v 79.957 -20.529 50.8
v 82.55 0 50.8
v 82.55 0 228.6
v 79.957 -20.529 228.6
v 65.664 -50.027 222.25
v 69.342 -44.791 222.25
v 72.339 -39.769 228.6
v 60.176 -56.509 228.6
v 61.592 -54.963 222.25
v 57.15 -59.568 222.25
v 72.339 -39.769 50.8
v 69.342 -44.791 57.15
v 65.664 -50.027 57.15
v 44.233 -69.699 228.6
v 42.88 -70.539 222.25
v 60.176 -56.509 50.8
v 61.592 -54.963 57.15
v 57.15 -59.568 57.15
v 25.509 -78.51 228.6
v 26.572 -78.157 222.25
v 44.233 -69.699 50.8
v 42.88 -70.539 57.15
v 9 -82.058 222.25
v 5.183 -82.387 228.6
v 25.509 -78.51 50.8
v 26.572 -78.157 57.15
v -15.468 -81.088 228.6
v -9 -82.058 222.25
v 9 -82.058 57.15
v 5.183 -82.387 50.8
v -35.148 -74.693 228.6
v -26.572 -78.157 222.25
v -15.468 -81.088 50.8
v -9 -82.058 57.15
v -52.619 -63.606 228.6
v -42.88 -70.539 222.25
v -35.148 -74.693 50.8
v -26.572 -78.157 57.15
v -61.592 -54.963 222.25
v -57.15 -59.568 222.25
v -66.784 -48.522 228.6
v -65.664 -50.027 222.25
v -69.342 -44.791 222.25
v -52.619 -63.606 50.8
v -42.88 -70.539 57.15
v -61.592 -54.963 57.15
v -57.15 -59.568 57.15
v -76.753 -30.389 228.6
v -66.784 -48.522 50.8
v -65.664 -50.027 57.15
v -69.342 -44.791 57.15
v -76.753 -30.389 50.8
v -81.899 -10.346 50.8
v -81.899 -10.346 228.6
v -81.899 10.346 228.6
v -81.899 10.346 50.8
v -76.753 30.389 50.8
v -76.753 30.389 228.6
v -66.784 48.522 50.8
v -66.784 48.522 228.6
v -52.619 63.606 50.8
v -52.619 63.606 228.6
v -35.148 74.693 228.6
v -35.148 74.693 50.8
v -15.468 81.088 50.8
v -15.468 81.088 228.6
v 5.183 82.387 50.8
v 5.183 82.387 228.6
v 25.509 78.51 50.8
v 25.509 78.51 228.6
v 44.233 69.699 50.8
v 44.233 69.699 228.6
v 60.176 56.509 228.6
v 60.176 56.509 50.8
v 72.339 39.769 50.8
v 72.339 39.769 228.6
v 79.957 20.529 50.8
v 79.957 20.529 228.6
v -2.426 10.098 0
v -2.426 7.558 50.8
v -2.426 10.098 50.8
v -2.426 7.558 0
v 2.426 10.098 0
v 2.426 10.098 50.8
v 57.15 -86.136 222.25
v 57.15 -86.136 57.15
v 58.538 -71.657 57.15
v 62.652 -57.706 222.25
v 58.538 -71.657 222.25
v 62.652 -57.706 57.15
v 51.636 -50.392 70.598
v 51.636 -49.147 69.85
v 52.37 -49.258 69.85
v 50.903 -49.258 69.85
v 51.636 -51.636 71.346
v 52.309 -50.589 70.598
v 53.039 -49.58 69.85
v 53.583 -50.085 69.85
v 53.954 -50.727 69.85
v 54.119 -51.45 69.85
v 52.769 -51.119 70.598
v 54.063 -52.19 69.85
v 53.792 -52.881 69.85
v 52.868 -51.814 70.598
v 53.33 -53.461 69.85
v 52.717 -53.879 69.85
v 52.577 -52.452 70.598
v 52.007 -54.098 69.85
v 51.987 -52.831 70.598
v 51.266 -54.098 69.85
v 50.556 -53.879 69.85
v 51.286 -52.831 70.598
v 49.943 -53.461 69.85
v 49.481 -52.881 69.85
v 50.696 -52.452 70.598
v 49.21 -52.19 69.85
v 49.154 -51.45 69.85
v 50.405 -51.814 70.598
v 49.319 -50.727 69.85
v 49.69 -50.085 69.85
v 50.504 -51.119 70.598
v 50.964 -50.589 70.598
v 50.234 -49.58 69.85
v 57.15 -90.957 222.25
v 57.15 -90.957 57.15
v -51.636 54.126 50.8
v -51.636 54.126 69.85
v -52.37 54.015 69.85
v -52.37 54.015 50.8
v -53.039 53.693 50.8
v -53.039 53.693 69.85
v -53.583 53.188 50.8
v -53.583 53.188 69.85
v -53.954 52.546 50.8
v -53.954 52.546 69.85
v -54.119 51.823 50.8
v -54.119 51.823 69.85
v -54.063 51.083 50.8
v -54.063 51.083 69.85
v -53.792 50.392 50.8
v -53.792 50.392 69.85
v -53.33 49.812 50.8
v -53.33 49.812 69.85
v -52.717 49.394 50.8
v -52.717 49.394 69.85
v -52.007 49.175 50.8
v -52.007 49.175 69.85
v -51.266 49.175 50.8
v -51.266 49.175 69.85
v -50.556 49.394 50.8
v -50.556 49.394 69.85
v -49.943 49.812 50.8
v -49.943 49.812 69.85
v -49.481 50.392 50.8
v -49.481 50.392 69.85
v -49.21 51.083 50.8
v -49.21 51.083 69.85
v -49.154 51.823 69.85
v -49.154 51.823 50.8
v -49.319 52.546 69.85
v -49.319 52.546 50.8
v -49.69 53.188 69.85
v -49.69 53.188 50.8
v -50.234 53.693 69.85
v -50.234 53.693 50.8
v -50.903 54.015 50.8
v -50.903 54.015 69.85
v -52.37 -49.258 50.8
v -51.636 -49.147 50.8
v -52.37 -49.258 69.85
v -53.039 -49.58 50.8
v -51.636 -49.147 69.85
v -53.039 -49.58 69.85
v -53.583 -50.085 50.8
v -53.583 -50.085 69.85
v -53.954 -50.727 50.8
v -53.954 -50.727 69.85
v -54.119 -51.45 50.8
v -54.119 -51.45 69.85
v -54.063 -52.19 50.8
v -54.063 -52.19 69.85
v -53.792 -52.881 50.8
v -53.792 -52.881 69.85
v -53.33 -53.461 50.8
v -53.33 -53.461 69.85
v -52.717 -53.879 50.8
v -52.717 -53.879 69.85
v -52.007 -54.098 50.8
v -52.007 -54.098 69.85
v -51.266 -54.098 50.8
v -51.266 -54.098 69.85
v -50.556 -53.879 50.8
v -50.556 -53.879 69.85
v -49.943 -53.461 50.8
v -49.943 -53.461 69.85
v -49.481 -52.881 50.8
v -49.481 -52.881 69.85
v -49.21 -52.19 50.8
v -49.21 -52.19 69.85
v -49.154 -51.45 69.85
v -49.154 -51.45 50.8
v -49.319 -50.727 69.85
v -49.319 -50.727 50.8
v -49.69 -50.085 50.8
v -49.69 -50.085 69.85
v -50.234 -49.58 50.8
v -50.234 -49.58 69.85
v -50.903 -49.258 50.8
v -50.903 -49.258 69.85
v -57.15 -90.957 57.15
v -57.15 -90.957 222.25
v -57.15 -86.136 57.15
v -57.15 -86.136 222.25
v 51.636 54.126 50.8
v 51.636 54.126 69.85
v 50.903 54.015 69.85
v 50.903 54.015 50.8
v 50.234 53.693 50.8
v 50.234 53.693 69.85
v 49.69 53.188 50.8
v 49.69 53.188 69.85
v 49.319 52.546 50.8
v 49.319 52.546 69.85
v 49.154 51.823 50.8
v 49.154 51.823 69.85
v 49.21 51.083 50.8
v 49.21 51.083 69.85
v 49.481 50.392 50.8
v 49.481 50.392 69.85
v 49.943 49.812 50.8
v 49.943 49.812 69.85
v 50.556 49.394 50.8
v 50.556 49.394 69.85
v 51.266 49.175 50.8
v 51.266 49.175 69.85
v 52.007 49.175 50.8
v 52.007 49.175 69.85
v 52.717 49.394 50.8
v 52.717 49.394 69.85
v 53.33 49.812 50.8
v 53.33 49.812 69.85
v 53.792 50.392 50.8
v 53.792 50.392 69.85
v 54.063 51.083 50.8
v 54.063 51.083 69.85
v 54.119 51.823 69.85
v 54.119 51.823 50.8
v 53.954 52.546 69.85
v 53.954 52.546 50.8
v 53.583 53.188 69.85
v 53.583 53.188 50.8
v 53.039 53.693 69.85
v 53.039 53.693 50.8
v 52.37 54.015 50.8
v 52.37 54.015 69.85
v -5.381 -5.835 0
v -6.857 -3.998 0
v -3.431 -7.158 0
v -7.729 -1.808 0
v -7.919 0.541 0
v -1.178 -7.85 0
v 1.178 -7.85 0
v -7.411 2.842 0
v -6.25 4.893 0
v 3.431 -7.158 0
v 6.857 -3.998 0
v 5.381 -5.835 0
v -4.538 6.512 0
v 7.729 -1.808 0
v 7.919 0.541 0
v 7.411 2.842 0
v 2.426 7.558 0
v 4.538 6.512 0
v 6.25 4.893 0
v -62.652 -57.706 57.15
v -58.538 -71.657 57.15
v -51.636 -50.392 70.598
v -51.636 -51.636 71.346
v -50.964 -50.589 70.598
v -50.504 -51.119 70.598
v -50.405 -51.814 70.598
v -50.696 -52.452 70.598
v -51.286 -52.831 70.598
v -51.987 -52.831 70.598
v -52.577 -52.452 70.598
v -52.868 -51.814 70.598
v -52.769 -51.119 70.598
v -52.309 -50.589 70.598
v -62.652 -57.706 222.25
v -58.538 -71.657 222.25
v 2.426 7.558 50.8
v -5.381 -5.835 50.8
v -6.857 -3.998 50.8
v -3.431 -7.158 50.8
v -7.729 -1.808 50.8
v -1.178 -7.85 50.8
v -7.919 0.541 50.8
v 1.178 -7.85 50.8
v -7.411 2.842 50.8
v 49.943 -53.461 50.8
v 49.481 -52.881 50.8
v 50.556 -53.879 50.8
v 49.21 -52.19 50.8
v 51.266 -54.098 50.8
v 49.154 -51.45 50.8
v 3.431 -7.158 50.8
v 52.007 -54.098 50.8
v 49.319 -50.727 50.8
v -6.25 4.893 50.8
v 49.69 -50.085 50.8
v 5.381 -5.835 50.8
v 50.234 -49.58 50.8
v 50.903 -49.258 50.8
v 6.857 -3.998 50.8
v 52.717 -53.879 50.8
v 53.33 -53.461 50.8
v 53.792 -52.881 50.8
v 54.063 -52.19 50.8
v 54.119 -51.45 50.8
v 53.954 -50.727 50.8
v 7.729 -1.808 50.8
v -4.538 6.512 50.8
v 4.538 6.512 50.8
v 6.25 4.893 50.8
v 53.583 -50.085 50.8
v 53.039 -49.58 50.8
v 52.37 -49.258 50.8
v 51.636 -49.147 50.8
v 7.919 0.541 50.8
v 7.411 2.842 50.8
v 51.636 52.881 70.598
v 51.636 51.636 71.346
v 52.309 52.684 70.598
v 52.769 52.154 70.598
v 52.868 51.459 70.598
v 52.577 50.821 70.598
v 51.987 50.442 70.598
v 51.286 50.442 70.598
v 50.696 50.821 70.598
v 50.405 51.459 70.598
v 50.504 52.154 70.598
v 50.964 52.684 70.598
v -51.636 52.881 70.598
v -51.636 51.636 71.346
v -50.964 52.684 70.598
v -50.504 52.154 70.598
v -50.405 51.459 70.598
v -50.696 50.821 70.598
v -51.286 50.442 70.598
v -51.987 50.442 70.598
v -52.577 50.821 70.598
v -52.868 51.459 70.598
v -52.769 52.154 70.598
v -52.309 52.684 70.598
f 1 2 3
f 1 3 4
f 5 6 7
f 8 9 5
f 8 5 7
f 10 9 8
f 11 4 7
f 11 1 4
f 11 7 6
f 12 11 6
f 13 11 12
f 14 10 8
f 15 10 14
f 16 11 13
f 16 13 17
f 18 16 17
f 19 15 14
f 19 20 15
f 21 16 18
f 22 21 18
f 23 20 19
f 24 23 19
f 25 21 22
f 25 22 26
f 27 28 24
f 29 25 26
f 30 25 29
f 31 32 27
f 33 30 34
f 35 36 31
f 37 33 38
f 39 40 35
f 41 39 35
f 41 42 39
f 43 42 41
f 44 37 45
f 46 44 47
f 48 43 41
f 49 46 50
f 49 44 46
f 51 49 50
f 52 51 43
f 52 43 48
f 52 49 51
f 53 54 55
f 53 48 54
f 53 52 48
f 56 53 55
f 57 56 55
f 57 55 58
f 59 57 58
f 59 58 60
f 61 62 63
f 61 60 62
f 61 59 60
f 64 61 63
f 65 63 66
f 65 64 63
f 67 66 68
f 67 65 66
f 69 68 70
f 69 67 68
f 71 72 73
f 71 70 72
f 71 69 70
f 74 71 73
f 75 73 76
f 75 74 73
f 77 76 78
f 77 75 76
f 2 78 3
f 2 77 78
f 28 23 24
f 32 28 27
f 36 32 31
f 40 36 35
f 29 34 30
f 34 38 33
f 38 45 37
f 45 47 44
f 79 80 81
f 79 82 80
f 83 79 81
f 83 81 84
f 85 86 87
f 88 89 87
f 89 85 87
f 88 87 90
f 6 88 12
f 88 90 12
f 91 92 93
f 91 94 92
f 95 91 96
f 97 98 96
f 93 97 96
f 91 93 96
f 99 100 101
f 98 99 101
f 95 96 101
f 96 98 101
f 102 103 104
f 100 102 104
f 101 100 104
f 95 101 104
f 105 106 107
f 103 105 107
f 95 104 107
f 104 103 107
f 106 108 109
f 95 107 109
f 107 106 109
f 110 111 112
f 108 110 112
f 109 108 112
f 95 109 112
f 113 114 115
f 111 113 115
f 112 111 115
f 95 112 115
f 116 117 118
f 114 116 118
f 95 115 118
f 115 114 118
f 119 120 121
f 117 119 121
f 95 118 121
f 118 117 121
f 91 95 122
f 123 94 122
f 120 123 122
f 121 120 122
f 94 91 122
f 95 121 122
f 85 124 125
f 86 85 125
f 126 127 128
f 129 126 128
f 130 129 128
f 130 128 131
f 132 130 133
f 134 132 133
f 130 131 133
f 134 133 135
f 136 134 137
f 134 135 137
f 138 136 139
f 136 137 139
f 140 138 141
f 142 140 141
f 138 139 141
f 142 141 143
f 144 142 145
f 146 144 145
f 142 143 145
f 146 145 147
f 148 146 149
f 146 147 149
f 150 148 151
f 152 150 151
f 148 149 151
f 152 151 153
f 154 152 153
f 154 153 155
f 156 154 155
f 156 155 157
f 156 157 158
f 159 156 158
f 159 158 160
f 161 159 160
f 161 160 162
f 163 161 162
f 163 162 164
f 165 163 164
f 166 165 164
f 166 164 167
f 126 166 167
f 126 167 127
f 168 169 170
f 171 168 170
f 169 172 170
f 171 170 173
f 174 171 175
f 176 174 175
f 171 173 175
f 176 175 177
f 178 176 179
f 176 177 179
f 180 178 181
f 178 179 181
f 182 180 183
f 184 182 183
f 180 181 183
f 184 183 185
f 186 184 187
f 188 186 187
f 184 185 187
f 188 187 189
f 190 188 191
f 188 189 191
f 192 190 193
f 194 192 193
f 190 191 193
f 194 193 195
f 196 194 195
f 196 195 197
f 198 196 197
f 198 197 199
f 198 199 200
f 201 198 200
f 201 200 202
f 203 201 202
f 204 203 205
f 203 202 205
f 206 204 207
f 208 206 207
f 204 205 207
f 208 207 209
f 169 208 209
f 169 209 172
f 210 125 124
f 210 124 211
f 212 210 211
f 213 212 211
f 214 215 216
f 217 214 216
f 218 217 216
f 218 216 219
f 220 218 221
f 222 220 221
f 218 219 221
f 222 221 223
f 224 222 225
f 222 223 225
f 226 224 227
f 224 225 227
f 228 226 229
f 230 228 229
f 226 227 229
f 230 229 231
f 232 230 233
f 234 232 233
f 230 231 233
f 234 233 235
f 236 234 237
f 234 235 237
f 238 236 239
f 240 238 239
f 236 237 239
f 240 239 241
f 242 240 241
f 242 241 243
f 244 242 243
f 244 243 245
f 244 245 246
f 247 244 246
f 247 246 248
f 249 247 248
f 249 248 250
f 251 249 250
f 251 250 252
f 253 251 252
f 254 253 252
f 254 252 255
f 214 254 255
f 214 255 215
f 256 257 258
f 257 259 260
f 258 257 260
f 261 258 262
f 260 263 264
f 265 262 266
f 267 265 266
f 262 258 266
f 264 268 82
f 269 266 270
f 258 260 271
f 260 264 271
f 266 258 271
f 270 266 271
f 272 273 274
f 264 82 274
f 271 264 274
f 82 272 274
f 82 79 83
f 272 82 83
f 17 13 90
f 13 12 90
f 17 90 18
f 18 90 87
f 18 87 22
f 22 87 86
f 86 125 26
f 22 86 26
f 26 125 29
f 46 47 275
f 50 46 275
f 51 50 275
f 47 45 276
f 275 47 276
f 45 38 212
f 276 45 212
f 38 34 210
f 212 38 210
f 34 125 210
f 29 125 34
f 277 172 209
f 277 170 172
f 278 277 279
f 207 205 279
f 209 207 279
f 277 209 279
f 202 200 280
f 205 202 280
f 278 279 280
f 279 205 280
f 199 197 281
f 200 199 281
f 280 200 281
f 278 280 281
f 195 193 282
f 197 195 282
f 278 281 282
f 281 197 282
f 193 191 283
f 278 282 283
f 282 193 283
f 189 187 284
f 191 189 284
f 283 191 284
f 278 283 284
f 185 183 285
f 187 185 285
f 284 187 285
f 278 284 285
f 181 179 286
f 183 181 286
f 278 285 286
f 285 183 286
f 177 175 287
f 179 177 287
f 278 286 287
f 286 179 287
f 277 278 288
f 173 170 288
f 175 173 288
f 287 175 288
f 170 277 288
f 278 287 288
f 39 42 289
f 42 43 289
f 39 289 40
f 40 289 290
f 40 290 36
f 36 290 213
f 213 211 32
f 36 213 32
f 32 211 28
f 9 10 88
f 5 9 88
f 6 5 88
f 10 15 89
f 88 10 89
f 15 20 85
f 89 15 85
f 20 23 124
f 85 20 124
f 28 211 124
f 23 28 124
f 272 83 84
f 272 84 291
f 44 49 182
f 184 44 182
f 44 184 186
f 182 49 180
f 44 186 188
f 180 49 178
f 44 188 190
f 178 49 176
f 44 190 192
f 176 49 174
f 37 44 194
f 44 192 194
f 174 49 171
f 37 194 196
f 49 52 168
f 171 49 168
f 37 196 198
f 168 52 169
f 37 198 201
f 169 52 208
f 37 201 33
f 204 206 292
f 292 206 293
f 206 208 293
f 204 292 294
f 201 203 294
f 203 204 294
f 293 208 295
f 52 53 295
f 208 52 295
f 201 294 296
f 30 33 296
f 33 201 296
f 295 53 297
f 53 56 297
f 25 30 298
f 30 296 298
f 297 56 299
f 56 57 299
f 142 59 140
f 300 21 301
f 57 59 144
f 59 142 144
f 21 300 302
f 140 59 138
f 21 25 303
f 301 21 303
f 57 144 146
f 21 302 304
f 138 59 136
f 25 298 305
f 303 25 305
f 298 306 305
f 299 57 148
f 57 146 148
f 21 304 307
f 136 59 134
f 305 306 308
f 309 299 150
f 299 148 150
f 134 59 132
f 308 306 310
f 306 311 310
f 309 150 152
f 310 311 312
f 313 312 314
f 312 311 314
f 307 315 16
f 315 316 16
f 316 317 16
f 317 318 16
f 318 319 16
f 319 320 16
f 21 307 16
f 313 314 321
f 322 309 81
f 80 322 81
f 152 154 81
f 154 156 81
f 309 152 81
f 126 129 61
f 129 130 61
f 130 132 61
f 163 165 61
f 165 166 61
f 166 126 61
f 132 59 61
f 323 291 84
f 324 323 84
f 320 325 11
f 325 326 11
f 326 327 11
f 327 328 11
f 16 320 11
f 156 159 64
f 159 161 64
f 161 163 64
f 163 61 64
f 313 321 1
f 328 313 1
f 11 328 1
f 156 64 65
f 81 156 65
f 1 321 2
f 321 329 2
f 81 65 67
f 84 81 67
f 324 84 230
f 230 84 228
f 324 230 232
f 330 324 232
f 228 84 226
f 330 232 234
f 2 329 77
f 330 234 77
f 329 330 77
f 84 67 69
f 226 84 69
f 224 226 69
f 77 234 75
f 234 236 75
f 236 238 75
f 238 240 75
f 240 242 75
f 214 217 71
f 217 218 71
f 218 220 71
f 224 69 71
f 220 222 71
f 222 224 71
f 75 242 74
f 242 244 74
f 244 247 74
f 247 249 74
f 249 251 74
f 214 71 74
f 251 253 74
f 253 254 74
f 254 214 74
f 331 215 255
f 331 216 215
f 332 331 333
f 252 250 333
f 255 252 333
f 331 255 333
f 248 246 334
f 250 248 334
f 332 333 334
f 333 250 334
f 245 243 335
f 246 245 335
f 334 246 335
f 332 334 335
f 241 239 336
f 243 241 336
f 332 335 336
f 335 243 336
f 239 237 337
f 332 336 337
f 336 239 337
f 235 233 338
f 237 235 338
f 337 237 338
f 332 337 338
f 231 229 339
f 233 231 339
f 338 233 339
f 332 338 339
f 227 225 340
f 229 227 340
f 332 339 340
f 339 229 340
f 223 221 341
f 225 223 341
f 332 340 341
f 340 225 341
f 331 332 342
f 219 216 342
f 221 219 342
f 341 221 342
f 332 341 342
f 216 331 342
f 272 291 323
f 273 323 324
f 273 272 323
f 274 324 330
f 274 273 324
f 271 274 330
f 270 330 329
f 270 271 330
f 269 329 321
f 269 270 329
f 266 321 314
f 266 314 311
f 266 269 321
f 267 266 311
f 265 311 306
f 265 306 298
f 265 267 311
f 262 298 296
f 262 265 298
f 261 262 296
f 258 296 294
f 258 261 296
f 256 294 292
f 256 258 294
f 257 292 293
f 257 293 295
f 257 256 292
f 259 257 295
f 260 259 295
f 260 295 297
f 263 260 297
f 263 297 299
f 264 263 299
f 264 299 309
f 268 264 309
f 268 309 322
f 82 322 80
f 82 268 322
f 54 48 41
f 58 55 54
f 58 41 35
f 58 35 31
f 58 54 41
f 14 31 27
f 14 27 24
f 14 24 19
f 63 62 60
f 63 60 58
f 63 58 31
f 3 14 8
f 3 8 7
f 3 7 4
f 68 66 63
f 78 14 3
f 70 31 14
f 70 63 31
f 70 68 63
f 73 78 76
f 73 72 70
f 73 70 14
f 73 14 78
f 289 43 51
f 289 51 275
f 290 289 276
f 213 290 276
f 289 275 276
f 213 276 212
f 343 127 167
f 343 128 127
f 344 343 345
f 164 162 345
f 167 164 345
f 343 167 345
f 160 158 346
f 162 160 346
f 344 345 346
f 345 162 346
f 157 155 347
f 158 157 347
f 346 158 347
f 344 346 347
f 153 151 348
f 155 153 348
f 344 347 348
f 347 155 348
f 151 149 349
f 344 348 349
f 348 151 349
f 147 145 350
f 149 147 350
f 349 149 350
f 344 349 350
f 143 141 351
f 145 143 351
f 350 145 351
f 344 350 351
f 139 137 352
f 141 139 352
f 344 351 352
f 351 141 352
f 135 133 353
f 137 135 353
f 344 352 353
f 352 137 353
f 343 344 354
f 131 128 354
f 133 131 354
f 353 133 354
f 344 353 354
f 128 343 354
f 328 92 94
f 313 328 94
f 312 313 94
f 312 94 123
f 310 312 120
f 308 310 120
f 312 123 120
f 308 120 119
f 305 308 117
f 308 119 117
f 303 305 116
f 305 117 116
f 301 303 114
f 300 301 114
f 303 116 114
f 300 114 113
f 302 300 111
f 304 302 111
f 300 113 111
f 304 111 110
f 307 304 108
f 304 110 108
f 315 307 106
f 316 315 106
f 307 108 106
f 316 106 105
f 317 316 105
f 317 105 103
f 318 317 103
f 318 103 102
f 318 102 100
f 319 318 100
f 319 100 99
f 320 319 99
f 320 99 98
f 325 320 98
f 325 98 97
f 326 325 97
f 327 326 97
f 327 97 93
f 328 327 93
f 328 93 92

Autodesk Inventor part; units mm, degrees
ref_plane "YZ Plane" through (0, 0, 0) normal (1, 0, 0) x (0, 1, 0)
ref_plane "XY Plane" through (0, 0, 0) normal (0, 0, 1) x (1, 0, 0)
sketch "Sketch1" plane through (0, 0, 0) normal (0, 0, 1) x (1, 0, 0)
  circle A0 centre (0, 0) radius 7.9375
  line L0 (-2.4257, 7.5578) -> (-2.4257, 10.0978)
  line L1 (-2.4257, 10.0978) -> (2.4257, 10.0978)
  line L2 (2.4257, 10.0978) -> (2.4257, 7.5578)
  point P0 (0, 10.0978)
  dimension "d0" = 15.875
  dimension "d1" = 2.54
  dimension "d2" = 4.8514
extrude "Extrusion1" add sketch "Sketch1" along normal blind 50.8
sketch "Sketch2" plane through (0, 0, 50.8) normal (0, 0, 1) x (1, 0, 0)
  circle A0 centre (0, 0) radius 82.55
  dimension "d5" = 165.1
extrude "Extrusion2" add sketch "Sketch2" along normal blind 177.8
sketch "Sketch3" plane through (0, 0, 50.8) normal (0, 0, -1) x (-1, 0, 0)
  circle A0 centre (0, 0) radius 73.025
  arc A1 (-2.4257, 7.5578) -> (2.4257, 7.5578) centre (0, 0) ccw projected
  line L0 (0, 0) -> (51.6365, 51.6365)
  line L1 (0, 0) -> (73.025, 0) construction
  line L2 (0, 0) -> (51.6365, -51.6365)
  line L3 (0, 0) -> (73.025, 0) construction
  line L4 (0, 0) -> (-51.6365, 51.6365)
  line L5 (0, 0) -> (73.025, 0) construction
  line L6 (0, 0) -> (-51.6365, -51.6365)
  line L7 (0, 0) -> (73.025, 0) construction
  dimension "d8" = 146.05
  dimension "d9" = 45
  dimension "d10" = 45
  dimension "d11" = 135
  dimension "d12" = 135
hole "Hole1" at (51.6365, 51.6365, 50.8) at (-51.6365, 51.6365, 50.8) at (-51.6365, -51.6365, 50.8) at (51.6365, -51.6365, 50.8) direction (0, 0, 1) diameter 4.9784 depth 19.05 tip angle 118 thread size "1/4-20 UNC" class "2B" standard "ANSI Unified Screw Threads"
ref_plane "Work Plane1" through (0, -82.55, 50.8) normal (0, 1, 0) x (-1, 0, 0)
sketch "Sketch4" plane through (0, -82.55, 50.8) normal (0, 1, 0) x (-1, 0, 0)
  line L0 (82.55, 177.8) -> (-82.55, 177.8) projected
  line L1 (-82.55, 0) -> (82.55, 0) projected
  line L2 (82.55, 0) -> (82.55, 177.8) projected
  line L3 (-82.55, 0) -> (-82.55, 177.8) projected
  line L4 (-57.15, 6.35) -> (57.15, 6.35)
  line L5 (57.15, 6.35) -> (57.15, 171.45)
  line L6 (57.15, 171.45) -> (-57.15, 171.45)
  line L7 (-57.15, 171.45) -> (-57.15, 6.35)
  point P0 (0, -50.8)
  point P1 (0, 6.35)
  dimension "d20" = 165.1
  dimension "d21" = 6.35
  dimension "d22" = 114.3
extrude "Extrusion3" add sketch "Sketch4" along normal blind 25.4 and the other way blind 8.4074 contours L7 L6 L5 L4
fillet "Fillet1" radius 76.2 1 edges at (-57.15, -59.5683, 139.7)
fillet "Fillet2" radius 76.2 1 edges at (57.15, -59.5683, 139.7)
equation "\"d3\" = ShaftL"
equation "\"d5\" = MotoD"
equation "\"d6\" = MotoL"
equation "\"ShaftL\" = 50.8"
equation "\"MotoD\" = 165.1"
equation "\"MotoL\" = 177.8"
properties part number "oldMotor4"
